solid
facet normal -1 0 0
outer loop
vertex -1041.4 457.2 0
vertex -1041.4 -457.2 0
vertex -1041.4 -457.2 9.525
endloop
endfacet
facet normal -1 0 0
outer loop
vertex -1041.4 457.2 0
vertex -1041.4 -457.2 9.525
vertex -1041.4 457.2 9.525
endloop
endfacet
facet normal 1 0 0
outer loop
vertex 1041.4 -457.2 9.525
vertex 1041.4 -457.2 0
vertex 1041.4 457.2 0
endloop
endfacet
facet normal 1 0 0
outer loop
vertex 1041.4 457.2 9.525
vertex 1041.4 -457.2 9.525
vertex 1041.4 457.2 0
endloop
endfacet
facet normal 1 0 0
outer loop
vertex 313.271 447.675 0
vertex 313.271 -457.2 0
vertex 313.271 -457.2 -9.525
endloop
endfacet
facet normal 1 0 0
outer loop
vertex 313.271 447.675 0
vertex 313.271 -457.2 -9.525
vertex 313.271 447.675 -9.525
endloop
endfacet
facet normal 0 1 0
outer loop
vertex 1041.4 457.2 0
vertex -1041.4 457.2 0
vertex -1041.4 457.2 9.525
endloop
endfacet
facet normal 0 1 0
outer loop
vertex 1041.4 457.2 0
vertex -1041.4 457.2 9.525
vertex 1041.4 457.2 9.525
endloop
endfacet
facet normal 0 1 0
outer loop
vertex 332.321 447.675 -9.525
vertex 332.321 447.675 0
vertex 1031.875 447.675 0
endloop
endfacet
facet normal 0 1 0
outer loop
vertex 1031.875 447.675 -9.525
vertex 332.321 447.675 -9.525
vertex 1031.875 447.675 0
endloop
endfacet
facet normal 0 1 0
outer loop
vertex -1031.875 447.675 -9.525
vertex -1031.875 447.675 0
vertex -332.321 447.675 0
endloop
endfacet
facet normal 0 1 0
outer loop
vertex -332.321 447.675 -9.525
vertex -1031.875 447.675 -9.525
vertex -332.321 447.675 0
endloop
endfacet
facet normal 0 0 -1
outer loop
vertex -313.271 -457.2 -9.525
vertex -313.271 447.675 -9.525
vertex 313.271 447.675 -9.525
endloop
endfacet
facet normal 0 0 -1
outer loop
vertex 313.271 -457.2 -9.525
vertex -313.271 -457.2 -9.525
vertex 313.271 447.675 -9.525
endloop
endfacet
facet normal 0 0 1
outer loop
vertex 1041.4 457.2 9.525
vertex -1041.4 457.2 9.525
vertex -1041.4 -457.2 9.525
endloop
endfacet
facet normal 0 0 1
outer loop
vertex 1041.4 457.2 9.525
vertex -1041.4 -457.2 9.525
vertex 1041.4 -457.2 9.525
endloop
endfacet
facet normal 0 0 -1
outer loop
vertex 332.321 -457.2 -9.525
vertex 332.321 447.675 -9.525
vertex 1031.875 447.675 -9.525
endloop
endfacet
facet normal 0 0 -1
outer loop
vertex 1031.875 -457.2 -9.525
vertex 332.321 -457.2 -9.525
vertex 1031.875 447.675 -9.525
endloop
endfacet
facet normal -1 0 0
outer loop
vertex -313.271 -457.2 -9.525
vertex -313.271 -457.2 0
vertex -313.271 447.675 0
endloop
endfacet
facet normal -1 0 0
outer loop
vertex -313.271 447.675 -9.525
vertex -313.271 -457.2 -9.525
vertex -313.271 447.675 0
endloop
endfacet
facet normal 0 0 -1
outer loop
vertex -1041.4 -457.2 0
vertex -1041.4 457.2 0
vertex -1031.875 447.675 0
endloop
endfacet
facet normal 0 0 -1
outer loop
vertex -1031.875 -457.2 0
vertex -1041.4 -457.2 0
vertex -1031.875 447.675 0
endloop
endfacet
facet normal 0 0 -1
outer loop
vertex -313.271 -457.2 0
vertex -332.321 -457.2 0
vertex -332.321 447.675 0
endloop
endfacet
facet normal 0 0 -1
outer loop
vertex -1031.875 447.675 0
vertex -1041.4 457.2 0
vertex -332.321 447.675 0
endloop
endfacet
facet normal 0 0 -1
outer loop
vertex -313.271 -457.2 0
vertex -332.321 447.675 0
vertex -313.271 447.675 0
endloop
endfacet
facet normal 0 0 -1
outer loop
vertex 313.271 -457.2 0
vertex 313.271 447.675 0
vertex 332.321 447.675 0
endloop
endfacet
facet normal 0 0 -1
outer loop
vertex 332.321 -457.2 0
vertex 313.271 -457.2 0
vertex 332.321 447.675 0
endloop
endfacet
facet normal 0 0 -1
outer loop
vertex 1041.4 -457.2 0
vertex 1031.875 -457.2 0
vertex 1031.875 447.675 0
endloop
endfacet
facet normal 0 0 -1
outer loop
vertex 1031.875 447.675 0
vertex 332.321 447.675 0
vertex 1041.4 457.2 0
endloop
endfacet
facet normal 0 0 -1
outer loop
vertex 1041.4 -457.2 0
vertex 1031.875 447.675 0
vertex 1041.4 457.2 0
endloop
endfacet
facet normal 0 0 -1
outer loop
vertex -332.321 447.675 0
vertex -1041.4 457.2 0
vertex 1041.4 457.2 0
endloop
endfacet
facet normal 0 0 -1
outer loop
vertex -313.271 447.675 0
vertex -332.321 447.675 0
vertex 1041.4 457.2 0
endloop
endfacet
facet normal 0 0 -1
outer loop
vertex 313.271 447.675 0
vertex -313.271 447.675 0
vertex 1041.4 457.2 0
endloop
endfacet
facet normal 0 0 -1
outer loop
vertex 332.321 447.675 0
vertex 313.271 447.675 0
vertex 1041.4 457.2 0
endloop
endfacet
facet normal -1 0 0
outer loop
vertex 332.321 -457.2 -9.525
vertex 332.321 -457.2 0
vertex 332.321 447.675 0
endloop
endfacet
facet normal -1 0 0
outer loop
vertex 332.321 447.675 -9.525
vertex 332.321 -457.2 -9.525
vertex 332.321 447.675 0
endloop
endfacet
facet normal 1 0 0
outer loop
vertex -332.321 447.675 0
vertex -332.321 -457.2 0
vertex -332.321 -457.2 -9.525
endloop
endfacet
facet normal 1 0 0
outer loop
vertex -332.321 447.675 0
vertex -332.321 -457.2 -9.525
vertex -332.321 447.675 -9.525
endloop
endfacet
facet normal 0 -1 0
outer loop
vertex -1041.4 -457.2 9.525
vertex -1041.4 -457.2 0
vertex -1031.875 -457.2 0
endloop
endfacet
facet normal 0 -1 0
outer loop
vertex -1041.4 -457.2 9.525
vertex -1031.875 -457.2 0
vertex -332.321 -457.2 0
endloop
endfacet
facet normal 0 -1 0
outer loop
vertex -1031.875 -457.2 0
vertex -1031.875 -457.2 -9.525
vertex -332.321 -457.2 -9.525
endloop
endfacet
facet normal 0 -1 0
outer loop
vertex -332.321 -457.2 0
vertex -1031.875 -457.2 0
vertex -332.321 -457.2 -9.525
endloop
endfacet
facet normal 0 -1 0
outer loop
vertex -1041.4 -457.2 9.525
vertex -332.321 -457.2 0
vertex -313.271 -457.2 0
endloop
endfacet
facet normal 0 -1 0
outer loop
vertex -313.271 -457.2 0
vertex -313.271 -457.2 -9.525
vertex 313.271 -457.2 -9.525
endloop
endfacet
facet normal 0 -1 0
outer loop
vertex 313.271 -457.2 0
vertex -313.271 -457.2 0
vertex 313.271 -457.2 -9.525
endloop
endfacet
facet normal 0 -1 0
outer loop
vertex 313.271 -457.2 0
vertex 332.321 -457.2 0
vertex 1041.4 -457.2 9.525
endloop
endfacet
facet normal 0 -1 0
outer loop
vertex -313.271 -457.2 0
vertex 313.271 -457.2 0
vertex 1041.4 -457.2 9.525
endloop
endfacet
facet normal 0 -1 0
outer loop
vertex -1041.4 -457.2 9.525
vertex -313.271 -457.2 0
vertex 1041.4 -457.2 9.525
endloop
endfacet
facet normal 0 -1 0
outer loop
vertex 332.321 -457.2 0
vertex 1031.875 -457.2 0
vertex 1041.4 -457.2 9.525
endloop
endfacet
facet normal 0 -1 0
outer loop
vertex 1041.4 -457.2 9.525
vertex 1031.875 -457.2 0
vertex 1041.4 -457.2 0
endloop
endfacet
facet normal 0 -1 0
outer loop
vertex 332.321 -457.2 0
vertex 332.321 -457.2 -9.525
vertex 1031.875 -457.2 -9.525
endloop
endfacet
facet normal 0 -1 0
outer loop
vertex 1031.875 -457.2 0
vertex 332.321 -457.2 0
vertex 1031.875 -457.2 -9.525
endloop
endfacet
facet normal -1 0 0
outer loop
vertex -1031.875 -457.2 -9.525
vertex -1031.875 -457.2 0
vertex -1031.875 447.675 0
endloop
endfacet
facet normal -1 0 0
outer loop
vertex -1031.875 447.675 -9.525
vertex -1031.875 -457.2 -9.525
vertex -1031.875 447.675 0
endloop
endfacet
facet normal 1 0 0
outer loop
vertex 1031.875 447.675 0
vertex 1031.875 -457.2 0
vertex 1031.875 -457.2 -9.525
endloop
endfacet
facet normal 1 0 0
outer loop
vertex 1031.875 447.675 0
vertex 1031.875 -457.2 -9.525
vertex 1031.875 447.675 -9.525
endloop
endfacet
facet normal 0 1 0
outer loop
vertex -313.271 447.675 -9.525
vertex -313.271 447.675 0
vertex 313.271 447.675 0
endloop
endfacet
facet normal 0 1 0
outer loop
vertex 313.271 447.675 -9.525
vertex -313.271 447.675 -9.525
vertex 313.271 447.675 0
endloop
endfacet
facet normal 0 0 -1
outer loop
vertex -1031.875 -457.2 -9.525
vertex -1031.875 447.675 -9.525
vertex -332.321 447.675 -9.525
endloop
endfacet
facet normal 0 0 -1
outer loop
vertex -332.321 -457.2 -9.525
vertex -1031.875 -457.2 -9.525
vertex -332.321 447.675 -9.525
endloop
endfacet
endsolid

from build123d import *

# Parameters (mm, degrees)
F0_W     = 2082.8
F0_H     = 914.4
F2_DEPTH = 9.525
F1_W     = 699.5541
F1_H     = 904.875
F1_W_2   = 626.5418
F3_DEPTH = 9.525


with BuildPart() as f2:
    # F0 (on Top) → F2 (new body)
    with BuildSketch(Plane.XY):
        Rectangle(F0_W, F0_H)
    extrude(amount=F2_DEPTH)

    # F1 (on Top) → F3 (join)
    with BuildSketch(Plane.XY):
        with Locations((-682.09795, -4.7625)):
            Rectangle(F1_W, F1_H)
        with Locations((682.09795, -4.7625)):
            Rectangle(F1_W, F1_H)
        with Locations((0, -4.7625)):
            Rectangle(F1_W_2, F1_H)
    extrude(amount=-F3_DEPTH)


solid = f2.part
